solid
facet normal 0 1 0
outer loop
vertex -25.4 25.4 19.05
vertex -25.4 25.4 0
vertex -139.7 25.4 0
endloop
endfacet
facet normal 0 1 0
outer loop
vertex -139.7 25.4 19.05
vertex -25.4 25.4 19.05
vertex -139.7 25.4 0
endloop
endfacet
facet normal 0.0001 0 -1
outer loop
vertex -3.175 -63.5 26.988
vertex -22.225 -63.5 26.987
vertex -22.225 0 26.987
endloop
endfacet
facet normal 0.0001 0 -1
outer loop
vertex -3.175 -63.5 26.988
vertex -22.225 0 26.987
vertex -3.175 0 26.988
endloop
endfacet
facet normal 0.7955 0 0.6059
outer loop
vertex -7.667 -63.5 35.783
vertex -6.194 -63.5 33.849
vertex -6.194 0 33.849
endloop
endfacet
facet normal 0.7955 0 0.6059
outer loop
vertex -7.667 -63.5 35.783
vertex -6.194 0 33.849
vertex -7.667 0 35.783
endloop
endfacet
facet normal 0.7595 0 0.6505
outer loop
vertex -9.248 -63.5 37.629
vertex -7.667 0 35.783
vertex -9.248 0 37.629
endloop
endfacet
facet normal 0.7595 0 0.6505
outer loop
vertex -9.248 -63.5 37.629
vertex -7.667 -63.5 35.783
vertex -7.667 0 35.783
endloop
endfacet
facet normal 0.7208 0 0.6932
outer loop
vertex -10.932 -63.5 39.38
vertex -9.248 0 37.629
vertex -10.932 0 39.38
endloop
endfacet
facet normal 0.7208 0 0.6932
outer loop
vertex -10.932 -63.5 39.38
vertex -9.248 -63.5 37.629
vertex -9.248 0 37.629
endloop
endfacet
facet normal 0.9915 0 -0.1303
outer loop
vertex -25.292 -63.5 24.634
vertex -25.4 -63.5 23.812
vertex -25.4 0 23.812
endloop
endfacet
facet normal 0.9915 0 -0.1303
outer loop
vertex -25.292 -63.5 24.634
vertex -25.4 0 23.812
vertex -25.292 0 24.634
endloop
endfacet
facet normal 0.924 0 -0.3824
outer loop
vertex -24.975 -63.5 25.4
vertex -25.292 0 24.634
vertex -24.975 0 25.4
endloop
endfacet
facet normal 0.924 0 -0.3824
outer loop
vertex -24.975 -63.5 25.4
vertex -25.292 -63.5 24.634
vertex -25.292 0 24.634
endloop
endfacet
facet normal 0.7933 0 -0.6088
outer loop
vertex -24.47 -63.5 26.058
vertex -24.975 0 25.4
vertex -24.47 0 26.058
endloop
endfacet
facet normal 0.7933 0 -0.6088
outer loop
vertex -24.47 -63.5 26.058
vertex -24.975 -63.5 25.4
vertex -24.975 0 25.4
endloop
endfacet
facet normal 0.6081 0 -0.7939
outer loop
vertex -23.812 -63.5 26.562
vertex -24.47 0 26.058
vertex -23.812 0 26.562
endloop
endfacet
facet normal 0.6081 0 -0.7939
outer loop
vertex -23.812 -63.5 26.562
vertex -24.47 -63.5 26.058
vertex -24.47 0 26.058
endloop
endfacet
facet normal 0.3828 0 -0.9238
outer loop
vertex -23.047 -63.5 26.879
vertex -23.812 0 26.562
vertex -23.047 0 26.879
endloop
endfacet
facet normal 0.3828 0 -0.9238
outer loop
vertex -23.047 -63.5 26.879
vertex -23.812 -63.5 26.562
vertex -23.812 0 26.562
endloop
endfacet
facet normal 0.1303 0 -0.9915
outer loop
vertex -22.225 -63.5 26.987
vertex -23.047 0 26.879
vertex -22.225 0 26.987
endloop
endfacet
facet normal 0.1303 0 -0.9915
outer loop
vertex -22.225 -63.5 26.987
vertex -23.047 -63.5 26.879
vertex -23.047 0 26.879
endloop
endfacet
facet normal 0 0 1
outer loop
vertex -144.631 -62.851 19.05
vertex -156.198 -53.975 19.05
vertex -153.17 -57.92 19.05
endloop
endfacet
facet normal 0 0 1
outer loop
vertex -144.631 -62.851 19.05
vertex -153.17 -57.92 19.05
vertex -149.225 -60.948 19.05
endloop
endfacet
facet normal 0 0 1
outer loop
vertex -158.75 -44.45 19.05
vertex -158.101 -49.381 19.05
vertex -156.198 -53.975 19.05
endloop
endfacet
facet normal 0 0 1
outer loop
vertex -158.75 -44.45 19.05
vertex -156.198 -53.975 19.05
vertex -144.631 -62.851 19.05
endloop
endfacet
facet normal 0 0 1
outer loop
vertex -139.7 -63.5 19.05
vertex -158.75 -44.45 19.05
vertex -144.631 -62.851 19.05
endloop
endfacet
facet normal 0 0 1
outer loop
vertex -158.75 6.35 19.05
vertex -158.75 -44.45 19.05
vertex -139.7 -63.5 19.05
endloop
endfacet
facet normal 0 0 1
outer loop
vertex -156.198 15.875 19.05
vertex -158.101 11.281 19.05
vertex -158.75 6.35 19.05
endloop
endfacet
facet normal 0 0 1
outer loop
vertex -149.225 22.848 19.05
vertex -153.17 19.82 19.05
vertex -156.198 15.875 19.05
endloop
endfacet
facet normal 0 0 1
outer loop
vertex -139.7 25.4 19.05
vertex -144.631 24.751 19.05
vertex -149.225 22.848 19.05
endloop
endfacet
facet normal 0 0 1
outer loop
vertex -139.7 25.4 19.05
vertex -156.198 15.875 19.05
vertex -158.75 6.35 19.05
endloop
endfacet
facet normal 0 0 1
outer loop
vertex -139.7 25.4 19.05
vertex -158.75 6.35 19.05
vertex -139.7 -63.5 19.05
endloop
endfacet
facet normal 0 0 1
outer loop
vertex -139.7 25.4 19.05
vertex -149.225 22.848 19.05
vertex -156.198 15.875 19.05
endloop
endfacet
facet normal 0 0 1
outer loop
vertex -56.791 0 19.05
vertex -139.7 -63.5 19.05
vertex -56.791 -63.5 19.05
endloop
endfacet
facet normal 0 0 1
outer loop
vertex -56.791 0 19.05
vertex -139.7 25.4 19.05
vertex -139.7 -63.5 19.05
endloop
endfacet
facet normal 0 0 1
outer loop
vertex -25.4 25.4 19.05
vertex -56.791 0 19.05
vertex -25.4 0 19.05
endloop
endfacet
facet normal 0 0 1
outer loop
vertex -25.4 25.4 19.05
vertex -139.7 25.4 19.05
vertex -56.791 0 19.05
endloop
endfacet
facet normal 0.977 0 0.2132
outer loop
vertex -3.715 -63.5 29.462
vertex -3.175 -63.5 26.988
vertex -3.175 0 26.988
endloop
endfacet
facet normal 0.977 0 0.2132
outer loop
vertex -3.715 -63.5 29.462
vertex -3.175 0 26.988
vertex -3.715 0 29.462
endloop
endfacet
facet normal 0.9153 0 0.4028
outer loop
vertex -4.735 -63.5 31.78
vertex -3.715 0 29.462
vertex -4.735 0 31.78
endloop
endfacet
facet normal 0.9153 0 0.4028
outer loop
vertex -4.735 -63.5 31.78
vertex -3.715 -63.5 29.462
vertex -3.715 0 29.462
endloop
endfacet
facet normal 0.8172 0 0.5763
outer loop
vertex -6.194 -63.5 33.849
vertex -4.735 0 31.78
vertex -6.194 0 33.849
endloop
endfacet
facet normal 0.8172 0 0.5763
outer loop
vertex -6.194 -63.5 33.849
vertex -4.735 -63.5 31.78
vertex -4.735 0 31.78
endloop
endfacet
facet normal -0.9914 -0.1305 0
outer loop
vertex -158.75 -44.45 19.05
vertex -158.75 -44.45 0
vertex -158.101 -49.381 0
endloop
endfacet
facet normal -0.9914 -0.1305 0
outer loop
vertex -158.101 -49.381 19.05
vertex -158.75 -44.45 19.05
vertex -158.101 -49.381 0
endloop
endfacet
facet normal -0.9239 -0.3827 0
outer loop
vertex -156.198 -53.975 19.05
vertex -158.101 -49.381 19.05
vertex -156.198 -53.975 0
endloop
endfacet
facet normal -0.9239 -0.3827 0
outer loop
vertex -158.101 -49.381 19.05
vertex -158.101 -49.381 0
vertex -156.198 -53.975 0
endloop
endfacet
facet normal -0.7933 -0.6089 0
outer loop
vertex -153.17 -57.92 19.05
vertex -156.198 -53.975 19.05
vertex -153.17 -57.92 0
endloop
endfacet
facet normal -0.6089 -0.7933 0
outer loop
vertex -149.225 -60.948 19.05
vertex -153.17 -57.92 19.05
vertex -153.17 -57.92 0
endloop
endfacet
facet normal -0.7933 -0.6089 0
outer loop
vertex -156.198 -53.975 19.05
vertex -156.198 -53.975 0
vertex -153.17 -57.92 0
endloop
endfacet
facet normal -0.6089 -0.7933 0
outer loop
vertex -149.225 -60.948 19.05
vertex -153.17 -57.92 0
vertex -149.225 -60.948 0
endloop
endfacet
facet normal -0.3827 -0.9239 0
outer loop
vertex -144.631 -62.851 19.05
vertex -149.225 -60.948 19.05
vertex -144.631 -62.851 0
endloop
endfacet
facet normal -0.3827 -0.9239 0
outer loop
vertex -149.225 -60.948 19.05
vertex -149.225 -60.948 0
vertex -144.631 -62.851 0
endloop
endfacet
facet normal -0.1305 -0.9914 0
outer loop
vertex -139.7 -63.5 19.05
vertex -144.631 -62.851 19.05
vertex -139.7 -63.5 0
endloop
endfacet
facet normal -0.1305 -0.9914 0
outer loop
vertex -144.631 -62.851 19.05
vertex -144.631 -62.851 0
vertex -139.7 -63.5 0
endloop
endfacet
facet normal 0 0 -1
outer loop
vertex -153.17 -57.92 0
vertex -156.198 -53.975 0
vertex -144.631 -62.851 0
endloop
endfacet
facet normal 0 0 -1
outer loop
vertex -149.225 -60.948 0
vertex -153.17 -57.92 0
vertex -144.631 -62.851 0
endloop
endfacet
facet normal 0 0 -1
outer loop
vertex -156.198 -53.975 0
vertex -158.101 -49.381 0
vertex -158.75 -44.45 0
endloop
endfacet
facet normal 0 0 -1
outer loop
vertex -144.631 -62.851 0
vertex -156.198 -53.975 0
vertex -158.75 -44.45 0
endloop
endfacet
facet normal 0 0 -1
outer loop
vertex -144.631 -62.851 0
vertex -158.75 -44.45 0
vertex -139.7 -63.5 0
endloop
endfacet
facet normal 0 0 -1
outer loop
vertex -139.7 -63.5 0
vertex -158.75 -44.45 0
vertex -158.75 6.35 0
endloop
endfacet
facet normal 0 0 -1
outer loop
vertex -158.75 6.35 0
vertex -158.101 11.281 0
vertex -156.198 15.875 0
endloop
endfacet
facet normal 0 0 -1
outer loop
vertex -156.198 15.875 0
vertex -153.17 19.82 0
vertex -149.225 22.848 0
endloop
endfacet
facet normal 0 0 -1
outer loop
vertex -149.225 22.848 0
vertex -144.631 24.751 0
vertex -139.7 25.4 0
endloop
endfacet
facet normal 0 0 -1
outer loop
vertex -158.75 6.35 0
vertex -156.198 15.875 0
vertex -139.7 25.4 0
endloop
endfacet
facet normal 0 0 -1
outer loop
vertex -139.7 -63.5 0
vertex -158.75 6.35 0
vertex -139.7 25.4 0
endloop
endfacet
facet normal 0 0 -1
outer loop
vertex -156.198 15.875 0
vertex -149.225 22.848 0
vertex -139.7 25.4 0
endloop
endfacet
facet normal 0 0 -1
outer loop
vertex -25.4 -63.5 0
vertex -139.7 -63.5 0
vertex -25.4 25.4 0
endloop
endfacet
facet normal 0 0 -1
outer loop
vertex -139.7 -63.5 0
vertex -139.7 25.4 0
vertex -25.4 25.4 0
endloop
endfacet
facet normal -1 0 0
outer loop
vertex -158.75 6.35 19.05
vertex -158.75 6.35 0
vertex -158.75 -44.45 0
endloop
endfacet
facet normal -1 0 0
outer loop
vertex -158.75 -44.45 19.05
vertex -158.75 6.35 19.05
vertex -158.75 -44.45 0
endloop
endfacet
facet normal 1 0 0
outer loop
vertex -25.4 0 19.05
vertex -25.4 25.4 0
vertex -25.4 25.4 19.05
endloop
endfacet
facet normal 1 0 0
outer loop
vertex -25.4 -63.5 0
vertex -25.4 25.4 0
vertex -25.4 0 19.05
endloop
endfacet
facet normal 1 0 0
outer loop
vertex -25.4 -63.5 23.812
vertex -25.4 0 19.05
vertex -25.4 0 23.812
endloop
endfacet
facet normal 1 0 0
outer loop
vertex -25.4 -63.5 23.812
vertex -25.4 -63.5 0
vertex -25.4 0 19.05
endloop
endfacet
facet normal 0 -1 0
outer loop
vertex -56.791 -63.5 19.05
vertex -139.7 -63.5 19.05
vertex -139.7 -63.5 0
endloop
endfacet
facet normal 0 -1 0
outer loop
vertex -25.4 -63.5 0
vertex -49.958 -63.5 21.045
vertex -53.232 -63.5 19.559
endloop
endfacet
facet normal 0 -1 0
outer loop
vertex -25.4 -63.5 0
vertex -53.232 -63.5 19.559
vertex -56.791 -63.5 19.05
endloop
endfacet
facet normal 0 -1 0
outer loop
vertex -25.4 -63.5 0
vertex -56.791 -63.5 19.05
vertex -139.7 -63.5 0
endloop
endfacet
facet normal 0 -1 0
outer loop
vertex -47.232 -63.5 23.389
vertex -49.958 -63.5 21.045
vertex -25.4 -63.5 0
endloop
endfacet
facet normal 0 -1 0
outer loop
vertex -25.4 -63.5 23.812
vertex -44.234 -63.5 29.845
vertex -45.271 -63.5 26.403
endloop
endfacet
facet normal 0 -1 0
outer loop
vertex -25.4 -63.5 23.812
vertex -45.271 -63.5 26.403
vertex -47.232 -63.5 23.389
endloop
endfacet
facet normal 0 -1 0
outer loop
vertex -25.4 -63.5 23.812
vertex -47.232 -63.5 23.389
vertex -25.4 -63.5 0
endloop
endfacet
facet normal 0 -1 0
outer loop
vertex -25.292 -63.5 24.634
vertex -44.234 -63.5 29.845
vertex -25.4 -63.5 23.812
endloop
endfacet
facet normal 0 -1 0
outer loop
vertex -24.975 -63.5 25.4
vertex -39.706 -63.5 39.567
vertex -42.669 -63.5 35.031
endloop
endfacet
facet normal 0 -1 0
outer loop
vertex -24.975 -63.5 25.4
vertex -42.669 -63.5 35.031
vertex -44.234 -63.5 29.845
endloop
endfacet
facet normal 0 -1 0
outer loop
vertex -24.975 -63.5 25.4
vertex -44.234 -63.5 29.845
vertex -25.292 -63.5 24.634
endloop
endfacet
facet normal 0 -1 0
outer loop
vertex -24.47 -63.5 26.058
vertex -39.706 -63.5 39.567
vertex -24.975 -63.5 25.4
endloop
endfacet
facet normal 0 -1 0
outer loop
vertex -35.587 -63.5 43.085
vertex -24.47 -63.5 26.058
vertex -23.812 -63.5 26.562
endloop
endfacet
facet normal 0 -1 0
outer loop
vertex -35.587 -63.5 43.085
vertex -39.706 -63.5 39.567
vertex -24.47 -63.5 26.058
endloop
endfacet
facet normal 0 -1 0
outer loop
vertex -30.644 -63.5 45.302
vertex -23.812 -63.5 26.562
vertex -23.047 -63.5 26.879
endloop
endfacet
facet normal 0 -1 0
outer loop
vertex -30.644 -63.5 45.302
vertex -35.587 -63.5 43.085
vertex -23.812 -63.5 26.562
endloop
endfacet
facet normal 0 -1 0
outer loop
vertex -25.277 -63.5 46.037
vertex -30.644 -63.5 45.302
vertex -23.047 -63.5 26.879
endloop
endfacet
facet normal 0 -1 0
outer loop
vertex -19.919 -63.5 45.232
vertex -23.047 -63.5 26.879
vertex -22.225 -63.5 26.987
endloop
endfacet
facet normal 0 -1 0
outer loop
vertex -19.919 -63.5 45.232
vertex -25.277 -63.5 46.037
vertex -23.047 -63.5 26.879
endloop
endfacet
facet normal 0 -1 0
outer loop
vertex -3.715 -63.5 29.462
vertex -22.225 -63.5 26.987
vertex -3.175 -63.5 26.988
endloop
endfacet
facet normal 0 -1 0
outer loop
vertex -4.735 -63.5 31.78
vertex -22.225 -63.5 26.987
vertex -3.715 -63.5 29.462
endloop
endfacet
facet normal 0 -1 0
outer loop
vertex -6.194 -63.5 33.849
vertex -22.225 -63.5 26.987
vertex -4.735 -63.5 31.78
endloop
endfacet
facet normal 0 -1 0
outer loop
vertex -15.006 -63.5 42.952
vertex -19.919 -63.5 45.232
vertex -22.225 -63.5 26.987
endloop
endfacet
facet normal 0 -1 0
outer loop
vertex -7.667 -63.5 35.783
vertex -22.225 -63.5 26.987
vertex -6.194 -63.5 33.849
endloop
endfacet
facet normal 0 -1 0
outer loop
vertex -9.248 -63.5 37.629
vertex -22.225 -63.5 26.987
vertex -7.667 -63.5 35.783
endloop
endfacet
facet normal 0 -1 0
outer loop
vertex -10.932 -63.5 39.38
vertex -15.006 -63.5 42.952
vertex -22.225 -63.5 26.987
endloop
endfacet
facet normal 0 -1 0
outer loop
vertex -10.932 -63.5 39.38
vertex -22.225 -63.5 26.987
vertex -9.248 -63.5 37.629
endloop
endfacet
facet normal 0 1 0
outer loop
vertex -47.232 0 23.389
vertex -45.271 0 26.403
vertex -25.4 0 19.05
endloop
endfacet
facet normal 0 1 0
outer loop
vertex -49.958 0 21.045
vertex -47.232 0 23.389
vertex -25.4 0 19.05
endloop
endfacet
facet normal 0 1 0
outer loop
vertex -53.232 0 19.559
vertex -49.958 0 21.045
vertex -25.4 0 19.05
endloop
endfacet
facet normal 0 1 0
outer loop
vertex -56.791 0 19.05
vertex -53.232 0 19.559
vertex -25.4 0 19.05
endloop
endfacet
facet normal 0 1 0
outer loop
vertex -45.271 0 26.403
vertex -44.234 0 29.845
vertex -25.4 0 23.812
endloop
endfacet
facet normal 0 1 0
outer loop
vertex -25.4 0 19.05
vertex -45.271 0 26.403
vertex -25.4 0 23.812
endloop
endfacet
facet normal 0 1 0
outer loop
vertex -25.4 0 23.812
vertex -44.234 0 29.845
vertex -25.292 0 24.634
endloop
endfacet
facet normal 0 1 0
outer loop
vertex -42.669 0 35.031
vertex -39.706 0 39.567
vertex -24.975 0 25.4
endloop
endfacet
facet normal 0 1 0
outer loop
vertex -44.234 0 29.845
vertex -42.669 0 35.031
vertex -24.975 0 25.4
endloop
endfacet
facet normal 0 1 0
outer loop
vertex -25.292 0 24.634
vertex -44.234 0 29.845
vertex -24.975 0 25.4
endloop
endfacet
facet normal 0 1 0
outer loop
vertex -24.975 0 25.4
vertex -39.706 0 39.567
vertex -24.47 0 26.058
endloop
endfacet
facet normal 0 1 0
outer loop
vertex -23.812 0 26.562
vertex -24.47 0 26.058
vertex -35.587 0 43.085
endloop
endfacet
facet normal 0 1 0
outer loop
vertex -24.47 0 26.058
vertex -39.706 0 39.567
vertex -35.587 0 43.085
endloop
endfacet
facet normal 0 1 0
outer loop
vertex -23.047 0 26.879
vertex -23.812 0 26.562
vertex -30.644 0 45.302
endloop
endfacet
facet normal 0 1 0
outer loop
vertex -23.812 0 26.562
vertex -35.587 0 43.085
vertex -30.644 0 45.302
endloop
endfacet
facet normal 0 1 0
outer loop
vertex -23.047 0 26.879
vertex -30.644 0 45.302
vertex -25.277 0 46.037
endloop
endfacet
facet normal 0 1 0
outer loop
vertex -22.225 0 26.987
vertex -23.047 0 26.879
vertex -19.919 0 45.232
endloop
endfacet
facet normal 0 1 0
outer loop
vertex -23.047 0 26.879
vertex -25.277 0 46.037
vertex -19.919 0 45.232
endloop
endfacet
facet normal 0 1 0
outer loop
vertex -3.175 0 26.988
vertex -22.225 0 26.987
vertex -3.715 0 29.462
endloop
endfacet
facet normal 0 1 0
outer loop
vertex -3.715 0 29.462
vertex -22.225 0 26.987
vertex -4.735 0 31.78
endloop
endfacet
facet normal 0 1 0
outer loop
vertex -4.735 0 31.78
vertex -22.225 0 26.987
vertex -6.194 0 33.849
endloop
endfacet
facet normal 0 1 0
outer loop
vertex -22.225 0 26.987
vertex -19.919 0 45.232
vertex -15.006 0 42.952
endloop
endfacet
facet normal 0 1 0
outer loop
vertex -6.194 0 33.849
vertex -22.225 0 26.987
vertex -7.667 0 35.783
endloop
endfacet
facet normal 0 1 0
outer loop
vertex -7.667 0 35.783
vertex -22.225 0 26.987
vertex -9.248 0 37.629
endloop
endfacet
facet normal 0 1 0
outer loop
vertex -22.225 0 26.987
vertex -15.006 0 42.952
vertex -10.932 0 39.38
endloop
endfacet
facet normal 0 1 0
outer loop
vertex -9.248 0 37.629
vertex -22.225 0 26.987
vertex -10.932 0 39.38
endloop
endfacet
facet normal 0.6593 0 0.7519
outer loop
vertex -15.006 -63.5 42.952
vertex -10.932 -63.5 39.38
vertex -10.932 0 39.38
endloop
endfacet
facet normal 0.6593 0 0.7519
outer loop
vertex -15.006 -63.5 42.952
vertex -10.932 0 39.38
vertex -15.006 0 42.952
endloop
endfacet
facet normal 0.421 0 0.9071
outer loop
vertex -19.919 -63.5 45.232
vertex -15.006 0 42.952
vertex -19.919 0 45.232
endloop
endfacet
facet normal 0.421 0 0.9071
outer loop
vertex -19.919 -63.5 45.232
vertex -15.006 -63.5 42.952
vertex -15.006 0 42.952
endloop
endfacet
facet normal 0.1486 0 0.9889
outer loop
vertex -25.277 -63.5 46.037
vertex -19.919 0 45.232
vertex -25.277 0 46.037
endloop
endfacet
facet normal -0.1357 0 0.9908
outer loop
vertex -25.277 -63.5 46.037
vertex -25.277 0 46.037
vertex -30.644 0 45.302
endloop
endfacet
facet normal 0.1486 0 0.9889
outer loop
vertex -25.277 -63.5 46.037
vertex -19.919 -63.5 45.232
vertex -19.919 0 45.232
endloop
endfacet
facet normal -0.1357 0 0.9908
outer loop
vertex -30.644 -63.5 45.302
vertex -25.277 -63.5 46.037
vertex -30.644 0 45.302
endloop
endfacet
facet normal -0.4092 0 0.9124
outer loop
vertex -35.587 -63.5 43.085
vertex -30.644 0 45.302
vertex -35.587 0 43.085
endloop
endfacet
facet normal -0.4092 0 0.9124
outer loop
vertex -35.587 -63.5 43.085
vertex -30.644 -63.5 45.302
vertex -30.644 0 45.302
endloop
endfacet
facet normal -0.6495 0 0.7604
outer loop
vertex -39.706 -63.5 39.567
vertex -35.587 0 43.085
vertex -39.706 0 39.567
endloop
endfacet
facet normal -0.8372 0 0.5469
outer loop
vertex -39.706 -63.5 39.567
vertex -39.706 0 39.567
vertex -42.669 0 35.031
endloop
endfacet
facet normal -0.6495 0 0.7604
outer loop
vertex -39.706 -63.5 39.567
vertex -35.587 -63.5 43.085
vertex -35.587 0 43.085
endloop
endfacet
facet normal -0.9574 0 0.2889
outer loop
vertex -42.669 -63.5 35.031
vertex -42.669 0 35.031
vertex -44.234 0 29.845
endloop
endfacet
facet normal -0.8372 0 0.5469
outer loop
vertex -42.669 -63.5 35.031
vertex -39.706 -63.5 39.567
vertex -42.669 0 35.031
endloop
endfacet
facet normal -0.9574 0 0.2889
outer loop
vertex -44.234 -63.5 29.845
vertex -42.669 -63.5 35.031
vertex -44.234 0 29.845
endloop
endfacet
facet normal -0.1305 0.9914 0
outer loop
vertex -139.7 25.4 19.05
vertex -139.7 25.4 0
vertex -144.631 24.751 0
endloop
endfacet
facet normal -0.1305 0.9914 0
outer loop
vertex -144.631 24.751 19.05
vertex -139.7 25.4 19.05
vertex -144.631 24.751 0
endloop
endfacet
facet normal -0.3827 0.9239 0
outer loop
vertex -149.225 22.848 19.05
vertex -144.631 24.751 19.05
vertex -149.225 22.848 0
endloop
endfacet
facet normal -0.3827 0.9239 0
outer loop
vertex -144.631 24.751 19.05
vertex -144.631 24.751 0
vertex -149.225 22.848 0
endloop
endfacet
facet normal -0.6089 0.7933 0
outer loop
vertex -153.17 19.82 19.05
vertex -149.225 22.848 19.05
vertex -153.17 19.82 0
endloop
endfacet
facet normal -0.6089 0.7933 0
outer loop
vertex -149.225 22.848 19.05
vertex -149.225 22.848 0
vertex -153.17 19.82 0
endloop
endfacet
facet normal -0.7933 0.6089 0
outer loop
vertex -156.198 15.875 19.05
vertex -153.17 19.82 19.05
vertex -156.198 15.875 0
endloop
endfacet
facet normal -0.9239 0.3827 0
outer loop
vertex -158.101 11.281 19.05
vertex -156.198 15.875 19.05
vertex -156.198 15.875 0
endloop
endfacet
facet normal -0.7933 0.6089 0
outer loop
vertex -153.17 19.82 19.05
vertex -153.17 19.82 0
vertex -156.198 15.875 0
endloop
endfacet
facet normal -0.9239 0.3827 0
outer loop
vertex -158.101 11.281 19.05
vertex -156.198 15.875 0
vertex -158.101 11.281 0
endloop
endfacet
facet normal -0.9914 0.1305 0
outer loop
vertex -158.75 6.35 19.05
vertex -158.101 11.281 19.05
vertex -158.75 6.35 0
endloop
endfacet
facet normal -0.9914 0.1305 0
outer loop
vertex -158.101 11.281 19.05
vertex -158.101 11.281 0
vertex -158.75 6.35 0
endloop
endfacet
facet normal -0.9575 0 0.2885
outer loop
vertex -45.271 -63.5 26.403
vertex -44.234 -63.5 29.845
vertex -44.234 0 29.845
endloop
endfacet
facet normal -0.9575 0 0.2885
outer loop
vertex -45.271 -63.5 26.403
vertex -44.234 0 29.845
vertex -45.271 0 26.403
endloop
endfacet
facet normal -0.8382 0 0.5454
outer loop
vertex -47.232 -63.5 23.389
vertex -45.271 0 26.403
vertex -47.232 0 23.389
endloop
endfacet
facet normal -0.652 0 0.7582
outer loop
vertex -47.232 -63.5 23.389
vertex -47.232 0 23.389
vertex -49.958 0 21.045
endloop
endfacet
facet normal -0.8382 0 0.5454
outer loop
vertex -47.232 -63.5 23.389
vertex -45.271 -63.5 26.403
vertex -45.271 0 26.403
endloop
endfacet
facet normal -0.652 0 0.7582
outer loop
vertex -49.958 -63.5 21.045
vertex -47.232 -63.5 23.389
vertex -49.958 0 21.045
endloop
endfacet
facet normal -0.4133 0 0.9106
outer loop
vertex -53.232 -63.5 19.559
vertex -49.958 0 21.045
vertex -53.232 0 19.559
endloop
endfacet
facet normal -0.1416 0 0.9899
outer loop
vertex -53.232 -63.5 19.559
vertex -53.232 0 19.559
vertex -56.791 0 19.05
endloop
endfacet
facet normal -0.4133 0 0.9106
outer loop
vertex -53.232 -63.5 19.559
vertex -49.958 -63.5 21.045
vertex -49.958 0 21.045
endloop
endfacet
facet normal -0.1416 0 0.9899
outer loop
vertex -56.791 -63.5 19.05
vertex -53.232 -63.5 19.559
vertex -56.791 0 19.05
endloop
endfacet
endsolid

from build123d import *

# Parameters (mm, degrees)
F1_DEPTH = 19.05
F4_DEPTH = 63.5


with BuildPart() as f1:
    # F0 (on Top) → F1 (new body)
    with BuildSketch(Plane.XY):
        with BuildLine():
            Line((-139.7, -63.5), (-25.4, -63.5))
            Line((-25.4, -63.5), (-25.4, 25.4))
            Line((-25.4, 25.4), (-139.7, 25.4))
            ThreePointArc((-139.7, 25.4), (-153.170384, 19.820384), (-158.75, 6.35))
            Line((-158.75, 6.35), (-158.75, -44.45))
            ThreePointArc((-158.75, -44.45), (-153.170384, -57.920384), (-139.7, -63.5))
        make_face()
    extrude(amount=F1_DEPTH)

    # F3 (on offset) → F4 (join)
    with BuildSketch(Plane.XZ.offset(63.5)):
        with BuildLine():
            Line((-56.79078, 19.05), (-25.4, 19.05))
            Line((-25.4, 19.05), (-25.4, 23.8125))
            ThreePointArc((-25.4, 23.8125), (-24.470064, 26.057564), (-22.225, 26.9875))
            Line((-22.225, 26.9875), (-3.175, 26.9875))
            ThreePointArc((-3.175, 26.9875), (-4.166839, 30.646295), (-6.194382, 33.849356))
            ThreePointArc((-6.194382, 33.849356), (-8.443828, 36.717161), (-10.932128, 39.380368))
            ThreePointArc((-10.932128, 39.380368), (-30.643815, 45.301563), (-44.234468, 29.845))
            ThreePointArc((-44.234468, 29.845), (-48.511393, 22.119748), (-56.79078, 19.05))
        make_face()
    extrude(amount=-F4_DEPTH)


solid = f1.part
